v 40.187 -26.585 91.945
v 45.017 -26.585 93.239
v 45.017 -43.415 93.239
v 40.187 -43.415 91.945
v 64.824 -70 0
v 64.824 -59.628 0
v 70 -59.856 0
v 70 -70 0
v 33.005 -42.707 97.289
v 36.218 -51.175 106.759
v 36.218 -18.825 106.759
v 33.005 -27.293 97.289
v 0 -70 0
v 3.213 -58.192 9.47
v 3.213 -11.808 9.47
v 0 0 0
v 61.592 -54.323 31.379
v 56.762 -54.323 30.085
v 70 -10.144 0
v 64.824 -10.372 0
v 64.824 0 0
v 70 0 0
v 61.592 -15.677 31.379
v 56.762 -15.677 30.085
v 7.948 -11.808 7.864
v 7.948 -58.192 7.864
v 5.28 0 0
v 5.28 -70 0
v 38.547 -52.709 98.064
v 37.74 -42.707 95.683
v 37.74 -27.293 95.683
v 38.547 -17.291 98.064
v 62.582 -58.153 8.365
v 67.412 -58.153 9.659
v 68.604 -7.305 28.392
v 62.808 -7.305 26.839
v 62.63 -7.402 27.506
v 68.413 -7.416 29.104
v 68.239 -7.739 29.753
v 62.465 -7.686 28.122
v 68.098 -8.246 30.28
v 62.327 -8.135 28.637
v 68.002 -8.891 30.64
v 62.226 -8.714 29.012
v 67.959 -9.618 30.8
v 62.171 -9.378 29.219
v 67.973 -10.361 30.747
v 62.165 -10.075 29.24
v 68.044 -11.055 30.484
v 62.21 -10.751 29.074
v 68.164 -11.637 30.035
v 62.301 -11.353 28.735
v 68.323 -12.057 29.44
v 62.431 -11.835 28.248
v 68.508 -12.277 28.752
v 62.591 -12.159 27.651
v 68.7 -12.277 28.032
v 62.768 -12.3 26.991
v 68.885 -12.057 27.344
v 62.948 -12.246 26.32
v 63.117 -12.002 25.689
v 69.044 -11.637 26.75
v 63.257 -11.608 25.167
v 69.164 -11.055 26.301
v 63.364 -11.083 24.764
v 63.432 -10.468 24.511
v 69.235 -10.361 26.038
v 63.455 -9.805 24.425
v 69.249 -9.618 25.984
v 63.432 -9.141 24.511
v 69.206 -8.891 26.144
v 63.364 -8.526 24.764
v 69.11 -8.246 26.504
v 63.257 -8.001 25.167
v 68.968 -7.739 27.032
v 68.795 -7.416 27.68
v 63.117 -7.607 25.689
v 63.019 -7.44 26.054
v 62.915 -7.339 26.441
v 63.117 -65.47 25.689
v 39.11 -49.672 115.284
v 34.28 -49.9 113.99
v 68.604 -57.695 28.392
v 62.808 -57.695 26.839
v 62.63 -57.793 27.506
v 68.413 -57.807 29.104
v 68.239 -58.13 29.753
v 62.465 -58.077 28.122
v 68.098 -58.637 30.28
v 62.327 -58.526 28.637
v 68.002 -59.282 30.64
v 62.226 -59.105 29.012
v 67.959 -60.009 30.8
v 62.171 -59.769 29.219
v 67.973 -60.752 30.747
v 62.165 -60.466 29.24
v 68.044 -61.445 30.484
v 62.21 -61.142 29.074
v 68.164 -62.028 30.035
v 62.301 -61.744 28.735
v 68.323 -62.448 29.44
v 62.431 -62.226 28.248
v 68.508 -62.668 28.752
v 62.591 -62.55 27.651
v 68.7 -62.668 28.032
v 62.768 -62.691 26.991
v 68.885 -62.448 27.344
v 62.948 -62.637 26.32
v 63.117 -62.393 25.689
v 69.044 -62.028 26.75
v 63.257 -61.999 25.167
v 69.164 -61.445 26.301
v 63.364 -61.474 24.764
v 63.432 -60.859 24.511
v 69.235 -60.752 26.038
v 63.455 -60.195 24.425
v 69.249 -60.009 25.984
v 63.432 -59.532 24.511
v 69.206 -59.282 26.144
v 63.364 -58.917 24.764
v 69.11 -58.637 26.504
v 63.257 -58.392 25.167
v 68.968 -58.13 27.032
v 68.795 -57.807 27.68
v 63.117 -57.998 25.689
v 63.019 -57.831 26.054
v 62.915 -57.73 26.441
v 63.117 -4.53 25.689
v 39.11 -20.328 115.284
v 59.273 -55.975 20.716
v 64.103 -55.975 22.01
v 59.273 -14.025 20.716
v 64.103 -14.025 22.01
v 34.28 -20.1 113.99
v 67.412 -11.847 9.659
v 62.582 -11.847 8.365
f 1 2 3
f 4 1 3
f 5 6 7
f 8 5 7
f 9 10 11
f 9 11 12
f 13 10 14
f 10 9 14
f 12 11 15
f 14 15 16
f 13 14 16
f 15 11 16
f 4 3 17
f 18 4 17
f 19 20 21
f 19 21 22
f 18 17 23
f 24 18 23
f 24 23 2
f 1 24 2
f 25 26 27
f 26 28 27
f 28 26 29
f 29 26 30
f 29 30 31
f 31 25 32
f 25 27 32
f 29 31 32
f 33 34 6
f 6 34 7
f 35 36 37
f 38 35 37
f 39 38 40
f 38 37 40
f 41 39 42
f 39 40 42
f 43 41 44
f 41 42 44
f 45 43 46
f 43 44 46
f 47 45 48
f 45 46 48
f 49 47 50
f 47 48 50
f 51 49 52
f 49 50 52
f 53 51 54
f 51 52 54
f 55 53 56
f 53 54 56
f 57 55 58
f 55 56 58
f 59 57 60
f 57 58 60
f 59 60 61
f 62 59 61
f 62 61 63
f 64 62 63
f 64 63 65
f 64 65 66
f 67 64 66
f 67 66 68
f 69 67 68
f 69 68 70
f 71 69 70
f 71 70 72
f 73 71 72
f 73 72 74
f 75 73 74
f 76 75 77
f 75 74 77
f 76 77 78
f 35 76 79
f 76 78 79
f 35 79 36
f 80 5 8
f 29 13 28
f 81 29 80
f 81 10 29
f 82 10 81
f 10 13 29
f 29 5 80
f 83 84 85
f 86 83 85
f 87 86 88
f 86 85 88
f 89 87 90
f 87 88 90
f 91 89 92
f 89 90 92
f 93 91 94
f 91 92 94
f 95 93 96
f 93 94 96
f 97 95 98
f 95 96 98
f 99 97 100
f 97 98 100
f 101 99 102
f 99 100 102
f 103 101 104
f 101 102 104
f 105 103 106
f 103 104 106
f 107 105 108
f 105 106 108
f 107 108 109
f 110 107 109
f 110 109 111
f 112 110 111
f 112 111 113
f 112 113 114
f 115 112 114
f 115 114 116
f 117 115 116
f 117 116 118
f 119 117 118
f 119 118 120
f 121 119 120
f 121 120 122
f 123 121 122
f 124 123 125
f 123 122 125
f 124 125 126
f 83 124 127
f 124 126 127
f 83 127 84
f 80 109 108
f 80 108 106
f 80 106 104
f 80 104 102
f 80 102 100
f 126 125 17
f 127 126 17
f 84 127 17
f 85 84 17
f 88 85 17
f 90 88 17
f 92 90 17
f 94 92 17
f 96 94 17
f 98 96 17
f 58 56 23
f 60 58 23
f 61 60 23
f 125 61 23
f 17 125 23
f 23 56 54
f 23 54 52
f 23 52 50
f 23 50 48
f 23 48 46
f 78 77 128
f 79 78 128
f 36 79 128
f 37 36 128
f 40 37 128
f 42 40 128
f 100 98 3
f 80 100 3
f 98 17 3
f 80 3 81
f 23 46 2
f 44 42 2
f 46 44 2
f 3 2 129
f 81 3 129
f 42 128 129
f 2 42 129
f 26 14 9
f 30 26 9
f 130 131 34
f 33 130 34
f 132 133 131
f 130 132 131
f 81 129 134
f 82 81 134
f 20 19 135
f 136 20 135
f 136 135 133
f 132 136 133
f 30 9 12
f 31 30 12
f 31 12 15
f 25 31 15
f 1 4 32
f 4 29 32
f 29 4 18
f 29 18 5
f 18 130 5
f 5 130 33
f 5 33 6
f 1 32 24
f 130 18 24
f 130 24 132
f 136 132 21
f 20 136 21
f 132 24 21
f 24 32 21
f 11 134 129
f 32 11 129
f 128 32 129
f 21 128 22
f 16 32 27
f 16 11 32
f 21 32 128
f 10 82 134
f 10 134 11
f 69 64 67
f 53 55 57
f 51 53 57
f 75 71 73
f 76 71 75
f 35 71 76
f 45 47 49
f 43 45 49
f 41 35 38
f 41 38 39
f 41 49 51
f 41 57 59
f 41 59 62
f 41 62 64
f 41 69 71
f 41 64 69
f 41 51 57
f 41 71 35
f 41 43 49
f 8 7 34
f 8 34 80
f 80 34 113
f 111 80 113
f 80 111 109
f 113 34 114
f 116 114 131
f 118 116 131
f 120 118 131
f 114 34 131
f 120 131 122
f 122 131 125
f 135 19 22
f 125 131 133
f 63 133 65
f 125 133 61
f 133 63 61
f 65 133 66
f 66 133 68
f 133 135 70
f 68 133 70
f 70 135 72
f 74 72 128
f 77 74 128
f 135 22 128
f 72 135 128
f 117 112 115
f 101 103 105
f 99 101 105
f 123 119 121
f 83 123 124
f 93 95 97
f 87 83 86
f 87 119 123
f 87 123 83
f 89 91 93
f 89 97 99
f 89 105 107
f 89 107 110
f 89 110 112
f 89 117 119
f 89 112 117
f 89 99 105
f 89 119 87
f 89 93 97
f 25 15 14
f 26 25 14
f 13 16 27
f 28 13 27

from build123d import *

# Parameters (mm, degrees)
F1_DEPTH = 70
F3_DEPTH = 70.001
F5_DEPTH = 5
F7_DEPTH = 5
F6_R     = 2.5
F8_DEPTH = 6


with BuildPart() as f1:
    # F0 (on Front) → F1 (new body)
    with BuildSketch(Plane.XZ):
        Polygon((64.8236190979, 0), (70, 0), (63.1167820899, 25.6885189599), (39.1096145047, 115.2844881338), (34.2799853733, 113.9903929083), (36.2175250532, 106.7593963813), (0, 0), (5.2798833988, 0), (38.5474912469, 98.0638441664), align=None)
    extrude(amount=F1_DEPTH)

    # F2 (on Right) → F3 (cut, through all)
    with BuildSketch(Plane.YZ):
        Polygon((-31.1044628837, 176.4021748616), (0, 0), (48.4349839389, -5.1851687022), (65.811291337, 203.3304870129), align=None)
        Polygon((-111.5468591452, -12.9745472223), (-70, 0), (-38.8955371163, 176.4021748616), (-111.5468591452, 176.4021748616), align=None)
    extrude(amount=F3_DEPTH, mode=Mode.SUBTRACT)

    # F4 (on face) → F5 (cut)
    with BuildSketch(Plane(origin=(0, 0, 0), x_dir=(0, -1, 0), z_dir=(-0.9469906099, 0, 0.3212612407))):
        Polygon((58.1917434691, 10.0000029223), (42.7067823189, 102.7354300022), (27.2932176811, 102.7354300022), (11.8082565309, 10.0000029223), align=None)
    extrude(amount=-F5_DEPTH, mode=Mode.SUBTRACT)

    # F6 (on face) → F7 (cut)
    with BuildSketch(Plane(origin=(65.3108891325, 0, 17.5), x_dir=(0, 1, 0), z_dir=(0.9659258263, 0, 0.2588190451))):
        Polygon((-10.1440055617, -18.1173331572), (-11.8471934071, -8.1173331572), (-14.0249093092, 4.6687838175), (-55.9750906908, 4.6687838175), (-58.1528065929, -8.1173331572), (-59.8559944383, -18.1173331572), align=None)
        Polygon((-26.5845061685, 78.4104846719), (-43.4154938315, 78.4104846719), (-54.3229984458, 14.3687840231), (-15.6770015542, 14.3687840231), align=None)
    extrude(amount=-F7_DEPTH, mode=Mode.SUBTRACT)

    # F6 (on face) → F8 (join)
    with BuildSketch(Plane(origin=(65.3108891325, 0, 17.5), x_dir=(0, 1, 0), z_dir=(0.9659258263, 0, 0.2588190451))):
        with Locations((-60.195499549, 9.6687838175)):
            Circle(F6_R)
        with Locations((-9.804500451, 9.6687838175)):
            Circle(F6_R)
    extrude(amount=F8_DEPTH)


solid = f1.part
